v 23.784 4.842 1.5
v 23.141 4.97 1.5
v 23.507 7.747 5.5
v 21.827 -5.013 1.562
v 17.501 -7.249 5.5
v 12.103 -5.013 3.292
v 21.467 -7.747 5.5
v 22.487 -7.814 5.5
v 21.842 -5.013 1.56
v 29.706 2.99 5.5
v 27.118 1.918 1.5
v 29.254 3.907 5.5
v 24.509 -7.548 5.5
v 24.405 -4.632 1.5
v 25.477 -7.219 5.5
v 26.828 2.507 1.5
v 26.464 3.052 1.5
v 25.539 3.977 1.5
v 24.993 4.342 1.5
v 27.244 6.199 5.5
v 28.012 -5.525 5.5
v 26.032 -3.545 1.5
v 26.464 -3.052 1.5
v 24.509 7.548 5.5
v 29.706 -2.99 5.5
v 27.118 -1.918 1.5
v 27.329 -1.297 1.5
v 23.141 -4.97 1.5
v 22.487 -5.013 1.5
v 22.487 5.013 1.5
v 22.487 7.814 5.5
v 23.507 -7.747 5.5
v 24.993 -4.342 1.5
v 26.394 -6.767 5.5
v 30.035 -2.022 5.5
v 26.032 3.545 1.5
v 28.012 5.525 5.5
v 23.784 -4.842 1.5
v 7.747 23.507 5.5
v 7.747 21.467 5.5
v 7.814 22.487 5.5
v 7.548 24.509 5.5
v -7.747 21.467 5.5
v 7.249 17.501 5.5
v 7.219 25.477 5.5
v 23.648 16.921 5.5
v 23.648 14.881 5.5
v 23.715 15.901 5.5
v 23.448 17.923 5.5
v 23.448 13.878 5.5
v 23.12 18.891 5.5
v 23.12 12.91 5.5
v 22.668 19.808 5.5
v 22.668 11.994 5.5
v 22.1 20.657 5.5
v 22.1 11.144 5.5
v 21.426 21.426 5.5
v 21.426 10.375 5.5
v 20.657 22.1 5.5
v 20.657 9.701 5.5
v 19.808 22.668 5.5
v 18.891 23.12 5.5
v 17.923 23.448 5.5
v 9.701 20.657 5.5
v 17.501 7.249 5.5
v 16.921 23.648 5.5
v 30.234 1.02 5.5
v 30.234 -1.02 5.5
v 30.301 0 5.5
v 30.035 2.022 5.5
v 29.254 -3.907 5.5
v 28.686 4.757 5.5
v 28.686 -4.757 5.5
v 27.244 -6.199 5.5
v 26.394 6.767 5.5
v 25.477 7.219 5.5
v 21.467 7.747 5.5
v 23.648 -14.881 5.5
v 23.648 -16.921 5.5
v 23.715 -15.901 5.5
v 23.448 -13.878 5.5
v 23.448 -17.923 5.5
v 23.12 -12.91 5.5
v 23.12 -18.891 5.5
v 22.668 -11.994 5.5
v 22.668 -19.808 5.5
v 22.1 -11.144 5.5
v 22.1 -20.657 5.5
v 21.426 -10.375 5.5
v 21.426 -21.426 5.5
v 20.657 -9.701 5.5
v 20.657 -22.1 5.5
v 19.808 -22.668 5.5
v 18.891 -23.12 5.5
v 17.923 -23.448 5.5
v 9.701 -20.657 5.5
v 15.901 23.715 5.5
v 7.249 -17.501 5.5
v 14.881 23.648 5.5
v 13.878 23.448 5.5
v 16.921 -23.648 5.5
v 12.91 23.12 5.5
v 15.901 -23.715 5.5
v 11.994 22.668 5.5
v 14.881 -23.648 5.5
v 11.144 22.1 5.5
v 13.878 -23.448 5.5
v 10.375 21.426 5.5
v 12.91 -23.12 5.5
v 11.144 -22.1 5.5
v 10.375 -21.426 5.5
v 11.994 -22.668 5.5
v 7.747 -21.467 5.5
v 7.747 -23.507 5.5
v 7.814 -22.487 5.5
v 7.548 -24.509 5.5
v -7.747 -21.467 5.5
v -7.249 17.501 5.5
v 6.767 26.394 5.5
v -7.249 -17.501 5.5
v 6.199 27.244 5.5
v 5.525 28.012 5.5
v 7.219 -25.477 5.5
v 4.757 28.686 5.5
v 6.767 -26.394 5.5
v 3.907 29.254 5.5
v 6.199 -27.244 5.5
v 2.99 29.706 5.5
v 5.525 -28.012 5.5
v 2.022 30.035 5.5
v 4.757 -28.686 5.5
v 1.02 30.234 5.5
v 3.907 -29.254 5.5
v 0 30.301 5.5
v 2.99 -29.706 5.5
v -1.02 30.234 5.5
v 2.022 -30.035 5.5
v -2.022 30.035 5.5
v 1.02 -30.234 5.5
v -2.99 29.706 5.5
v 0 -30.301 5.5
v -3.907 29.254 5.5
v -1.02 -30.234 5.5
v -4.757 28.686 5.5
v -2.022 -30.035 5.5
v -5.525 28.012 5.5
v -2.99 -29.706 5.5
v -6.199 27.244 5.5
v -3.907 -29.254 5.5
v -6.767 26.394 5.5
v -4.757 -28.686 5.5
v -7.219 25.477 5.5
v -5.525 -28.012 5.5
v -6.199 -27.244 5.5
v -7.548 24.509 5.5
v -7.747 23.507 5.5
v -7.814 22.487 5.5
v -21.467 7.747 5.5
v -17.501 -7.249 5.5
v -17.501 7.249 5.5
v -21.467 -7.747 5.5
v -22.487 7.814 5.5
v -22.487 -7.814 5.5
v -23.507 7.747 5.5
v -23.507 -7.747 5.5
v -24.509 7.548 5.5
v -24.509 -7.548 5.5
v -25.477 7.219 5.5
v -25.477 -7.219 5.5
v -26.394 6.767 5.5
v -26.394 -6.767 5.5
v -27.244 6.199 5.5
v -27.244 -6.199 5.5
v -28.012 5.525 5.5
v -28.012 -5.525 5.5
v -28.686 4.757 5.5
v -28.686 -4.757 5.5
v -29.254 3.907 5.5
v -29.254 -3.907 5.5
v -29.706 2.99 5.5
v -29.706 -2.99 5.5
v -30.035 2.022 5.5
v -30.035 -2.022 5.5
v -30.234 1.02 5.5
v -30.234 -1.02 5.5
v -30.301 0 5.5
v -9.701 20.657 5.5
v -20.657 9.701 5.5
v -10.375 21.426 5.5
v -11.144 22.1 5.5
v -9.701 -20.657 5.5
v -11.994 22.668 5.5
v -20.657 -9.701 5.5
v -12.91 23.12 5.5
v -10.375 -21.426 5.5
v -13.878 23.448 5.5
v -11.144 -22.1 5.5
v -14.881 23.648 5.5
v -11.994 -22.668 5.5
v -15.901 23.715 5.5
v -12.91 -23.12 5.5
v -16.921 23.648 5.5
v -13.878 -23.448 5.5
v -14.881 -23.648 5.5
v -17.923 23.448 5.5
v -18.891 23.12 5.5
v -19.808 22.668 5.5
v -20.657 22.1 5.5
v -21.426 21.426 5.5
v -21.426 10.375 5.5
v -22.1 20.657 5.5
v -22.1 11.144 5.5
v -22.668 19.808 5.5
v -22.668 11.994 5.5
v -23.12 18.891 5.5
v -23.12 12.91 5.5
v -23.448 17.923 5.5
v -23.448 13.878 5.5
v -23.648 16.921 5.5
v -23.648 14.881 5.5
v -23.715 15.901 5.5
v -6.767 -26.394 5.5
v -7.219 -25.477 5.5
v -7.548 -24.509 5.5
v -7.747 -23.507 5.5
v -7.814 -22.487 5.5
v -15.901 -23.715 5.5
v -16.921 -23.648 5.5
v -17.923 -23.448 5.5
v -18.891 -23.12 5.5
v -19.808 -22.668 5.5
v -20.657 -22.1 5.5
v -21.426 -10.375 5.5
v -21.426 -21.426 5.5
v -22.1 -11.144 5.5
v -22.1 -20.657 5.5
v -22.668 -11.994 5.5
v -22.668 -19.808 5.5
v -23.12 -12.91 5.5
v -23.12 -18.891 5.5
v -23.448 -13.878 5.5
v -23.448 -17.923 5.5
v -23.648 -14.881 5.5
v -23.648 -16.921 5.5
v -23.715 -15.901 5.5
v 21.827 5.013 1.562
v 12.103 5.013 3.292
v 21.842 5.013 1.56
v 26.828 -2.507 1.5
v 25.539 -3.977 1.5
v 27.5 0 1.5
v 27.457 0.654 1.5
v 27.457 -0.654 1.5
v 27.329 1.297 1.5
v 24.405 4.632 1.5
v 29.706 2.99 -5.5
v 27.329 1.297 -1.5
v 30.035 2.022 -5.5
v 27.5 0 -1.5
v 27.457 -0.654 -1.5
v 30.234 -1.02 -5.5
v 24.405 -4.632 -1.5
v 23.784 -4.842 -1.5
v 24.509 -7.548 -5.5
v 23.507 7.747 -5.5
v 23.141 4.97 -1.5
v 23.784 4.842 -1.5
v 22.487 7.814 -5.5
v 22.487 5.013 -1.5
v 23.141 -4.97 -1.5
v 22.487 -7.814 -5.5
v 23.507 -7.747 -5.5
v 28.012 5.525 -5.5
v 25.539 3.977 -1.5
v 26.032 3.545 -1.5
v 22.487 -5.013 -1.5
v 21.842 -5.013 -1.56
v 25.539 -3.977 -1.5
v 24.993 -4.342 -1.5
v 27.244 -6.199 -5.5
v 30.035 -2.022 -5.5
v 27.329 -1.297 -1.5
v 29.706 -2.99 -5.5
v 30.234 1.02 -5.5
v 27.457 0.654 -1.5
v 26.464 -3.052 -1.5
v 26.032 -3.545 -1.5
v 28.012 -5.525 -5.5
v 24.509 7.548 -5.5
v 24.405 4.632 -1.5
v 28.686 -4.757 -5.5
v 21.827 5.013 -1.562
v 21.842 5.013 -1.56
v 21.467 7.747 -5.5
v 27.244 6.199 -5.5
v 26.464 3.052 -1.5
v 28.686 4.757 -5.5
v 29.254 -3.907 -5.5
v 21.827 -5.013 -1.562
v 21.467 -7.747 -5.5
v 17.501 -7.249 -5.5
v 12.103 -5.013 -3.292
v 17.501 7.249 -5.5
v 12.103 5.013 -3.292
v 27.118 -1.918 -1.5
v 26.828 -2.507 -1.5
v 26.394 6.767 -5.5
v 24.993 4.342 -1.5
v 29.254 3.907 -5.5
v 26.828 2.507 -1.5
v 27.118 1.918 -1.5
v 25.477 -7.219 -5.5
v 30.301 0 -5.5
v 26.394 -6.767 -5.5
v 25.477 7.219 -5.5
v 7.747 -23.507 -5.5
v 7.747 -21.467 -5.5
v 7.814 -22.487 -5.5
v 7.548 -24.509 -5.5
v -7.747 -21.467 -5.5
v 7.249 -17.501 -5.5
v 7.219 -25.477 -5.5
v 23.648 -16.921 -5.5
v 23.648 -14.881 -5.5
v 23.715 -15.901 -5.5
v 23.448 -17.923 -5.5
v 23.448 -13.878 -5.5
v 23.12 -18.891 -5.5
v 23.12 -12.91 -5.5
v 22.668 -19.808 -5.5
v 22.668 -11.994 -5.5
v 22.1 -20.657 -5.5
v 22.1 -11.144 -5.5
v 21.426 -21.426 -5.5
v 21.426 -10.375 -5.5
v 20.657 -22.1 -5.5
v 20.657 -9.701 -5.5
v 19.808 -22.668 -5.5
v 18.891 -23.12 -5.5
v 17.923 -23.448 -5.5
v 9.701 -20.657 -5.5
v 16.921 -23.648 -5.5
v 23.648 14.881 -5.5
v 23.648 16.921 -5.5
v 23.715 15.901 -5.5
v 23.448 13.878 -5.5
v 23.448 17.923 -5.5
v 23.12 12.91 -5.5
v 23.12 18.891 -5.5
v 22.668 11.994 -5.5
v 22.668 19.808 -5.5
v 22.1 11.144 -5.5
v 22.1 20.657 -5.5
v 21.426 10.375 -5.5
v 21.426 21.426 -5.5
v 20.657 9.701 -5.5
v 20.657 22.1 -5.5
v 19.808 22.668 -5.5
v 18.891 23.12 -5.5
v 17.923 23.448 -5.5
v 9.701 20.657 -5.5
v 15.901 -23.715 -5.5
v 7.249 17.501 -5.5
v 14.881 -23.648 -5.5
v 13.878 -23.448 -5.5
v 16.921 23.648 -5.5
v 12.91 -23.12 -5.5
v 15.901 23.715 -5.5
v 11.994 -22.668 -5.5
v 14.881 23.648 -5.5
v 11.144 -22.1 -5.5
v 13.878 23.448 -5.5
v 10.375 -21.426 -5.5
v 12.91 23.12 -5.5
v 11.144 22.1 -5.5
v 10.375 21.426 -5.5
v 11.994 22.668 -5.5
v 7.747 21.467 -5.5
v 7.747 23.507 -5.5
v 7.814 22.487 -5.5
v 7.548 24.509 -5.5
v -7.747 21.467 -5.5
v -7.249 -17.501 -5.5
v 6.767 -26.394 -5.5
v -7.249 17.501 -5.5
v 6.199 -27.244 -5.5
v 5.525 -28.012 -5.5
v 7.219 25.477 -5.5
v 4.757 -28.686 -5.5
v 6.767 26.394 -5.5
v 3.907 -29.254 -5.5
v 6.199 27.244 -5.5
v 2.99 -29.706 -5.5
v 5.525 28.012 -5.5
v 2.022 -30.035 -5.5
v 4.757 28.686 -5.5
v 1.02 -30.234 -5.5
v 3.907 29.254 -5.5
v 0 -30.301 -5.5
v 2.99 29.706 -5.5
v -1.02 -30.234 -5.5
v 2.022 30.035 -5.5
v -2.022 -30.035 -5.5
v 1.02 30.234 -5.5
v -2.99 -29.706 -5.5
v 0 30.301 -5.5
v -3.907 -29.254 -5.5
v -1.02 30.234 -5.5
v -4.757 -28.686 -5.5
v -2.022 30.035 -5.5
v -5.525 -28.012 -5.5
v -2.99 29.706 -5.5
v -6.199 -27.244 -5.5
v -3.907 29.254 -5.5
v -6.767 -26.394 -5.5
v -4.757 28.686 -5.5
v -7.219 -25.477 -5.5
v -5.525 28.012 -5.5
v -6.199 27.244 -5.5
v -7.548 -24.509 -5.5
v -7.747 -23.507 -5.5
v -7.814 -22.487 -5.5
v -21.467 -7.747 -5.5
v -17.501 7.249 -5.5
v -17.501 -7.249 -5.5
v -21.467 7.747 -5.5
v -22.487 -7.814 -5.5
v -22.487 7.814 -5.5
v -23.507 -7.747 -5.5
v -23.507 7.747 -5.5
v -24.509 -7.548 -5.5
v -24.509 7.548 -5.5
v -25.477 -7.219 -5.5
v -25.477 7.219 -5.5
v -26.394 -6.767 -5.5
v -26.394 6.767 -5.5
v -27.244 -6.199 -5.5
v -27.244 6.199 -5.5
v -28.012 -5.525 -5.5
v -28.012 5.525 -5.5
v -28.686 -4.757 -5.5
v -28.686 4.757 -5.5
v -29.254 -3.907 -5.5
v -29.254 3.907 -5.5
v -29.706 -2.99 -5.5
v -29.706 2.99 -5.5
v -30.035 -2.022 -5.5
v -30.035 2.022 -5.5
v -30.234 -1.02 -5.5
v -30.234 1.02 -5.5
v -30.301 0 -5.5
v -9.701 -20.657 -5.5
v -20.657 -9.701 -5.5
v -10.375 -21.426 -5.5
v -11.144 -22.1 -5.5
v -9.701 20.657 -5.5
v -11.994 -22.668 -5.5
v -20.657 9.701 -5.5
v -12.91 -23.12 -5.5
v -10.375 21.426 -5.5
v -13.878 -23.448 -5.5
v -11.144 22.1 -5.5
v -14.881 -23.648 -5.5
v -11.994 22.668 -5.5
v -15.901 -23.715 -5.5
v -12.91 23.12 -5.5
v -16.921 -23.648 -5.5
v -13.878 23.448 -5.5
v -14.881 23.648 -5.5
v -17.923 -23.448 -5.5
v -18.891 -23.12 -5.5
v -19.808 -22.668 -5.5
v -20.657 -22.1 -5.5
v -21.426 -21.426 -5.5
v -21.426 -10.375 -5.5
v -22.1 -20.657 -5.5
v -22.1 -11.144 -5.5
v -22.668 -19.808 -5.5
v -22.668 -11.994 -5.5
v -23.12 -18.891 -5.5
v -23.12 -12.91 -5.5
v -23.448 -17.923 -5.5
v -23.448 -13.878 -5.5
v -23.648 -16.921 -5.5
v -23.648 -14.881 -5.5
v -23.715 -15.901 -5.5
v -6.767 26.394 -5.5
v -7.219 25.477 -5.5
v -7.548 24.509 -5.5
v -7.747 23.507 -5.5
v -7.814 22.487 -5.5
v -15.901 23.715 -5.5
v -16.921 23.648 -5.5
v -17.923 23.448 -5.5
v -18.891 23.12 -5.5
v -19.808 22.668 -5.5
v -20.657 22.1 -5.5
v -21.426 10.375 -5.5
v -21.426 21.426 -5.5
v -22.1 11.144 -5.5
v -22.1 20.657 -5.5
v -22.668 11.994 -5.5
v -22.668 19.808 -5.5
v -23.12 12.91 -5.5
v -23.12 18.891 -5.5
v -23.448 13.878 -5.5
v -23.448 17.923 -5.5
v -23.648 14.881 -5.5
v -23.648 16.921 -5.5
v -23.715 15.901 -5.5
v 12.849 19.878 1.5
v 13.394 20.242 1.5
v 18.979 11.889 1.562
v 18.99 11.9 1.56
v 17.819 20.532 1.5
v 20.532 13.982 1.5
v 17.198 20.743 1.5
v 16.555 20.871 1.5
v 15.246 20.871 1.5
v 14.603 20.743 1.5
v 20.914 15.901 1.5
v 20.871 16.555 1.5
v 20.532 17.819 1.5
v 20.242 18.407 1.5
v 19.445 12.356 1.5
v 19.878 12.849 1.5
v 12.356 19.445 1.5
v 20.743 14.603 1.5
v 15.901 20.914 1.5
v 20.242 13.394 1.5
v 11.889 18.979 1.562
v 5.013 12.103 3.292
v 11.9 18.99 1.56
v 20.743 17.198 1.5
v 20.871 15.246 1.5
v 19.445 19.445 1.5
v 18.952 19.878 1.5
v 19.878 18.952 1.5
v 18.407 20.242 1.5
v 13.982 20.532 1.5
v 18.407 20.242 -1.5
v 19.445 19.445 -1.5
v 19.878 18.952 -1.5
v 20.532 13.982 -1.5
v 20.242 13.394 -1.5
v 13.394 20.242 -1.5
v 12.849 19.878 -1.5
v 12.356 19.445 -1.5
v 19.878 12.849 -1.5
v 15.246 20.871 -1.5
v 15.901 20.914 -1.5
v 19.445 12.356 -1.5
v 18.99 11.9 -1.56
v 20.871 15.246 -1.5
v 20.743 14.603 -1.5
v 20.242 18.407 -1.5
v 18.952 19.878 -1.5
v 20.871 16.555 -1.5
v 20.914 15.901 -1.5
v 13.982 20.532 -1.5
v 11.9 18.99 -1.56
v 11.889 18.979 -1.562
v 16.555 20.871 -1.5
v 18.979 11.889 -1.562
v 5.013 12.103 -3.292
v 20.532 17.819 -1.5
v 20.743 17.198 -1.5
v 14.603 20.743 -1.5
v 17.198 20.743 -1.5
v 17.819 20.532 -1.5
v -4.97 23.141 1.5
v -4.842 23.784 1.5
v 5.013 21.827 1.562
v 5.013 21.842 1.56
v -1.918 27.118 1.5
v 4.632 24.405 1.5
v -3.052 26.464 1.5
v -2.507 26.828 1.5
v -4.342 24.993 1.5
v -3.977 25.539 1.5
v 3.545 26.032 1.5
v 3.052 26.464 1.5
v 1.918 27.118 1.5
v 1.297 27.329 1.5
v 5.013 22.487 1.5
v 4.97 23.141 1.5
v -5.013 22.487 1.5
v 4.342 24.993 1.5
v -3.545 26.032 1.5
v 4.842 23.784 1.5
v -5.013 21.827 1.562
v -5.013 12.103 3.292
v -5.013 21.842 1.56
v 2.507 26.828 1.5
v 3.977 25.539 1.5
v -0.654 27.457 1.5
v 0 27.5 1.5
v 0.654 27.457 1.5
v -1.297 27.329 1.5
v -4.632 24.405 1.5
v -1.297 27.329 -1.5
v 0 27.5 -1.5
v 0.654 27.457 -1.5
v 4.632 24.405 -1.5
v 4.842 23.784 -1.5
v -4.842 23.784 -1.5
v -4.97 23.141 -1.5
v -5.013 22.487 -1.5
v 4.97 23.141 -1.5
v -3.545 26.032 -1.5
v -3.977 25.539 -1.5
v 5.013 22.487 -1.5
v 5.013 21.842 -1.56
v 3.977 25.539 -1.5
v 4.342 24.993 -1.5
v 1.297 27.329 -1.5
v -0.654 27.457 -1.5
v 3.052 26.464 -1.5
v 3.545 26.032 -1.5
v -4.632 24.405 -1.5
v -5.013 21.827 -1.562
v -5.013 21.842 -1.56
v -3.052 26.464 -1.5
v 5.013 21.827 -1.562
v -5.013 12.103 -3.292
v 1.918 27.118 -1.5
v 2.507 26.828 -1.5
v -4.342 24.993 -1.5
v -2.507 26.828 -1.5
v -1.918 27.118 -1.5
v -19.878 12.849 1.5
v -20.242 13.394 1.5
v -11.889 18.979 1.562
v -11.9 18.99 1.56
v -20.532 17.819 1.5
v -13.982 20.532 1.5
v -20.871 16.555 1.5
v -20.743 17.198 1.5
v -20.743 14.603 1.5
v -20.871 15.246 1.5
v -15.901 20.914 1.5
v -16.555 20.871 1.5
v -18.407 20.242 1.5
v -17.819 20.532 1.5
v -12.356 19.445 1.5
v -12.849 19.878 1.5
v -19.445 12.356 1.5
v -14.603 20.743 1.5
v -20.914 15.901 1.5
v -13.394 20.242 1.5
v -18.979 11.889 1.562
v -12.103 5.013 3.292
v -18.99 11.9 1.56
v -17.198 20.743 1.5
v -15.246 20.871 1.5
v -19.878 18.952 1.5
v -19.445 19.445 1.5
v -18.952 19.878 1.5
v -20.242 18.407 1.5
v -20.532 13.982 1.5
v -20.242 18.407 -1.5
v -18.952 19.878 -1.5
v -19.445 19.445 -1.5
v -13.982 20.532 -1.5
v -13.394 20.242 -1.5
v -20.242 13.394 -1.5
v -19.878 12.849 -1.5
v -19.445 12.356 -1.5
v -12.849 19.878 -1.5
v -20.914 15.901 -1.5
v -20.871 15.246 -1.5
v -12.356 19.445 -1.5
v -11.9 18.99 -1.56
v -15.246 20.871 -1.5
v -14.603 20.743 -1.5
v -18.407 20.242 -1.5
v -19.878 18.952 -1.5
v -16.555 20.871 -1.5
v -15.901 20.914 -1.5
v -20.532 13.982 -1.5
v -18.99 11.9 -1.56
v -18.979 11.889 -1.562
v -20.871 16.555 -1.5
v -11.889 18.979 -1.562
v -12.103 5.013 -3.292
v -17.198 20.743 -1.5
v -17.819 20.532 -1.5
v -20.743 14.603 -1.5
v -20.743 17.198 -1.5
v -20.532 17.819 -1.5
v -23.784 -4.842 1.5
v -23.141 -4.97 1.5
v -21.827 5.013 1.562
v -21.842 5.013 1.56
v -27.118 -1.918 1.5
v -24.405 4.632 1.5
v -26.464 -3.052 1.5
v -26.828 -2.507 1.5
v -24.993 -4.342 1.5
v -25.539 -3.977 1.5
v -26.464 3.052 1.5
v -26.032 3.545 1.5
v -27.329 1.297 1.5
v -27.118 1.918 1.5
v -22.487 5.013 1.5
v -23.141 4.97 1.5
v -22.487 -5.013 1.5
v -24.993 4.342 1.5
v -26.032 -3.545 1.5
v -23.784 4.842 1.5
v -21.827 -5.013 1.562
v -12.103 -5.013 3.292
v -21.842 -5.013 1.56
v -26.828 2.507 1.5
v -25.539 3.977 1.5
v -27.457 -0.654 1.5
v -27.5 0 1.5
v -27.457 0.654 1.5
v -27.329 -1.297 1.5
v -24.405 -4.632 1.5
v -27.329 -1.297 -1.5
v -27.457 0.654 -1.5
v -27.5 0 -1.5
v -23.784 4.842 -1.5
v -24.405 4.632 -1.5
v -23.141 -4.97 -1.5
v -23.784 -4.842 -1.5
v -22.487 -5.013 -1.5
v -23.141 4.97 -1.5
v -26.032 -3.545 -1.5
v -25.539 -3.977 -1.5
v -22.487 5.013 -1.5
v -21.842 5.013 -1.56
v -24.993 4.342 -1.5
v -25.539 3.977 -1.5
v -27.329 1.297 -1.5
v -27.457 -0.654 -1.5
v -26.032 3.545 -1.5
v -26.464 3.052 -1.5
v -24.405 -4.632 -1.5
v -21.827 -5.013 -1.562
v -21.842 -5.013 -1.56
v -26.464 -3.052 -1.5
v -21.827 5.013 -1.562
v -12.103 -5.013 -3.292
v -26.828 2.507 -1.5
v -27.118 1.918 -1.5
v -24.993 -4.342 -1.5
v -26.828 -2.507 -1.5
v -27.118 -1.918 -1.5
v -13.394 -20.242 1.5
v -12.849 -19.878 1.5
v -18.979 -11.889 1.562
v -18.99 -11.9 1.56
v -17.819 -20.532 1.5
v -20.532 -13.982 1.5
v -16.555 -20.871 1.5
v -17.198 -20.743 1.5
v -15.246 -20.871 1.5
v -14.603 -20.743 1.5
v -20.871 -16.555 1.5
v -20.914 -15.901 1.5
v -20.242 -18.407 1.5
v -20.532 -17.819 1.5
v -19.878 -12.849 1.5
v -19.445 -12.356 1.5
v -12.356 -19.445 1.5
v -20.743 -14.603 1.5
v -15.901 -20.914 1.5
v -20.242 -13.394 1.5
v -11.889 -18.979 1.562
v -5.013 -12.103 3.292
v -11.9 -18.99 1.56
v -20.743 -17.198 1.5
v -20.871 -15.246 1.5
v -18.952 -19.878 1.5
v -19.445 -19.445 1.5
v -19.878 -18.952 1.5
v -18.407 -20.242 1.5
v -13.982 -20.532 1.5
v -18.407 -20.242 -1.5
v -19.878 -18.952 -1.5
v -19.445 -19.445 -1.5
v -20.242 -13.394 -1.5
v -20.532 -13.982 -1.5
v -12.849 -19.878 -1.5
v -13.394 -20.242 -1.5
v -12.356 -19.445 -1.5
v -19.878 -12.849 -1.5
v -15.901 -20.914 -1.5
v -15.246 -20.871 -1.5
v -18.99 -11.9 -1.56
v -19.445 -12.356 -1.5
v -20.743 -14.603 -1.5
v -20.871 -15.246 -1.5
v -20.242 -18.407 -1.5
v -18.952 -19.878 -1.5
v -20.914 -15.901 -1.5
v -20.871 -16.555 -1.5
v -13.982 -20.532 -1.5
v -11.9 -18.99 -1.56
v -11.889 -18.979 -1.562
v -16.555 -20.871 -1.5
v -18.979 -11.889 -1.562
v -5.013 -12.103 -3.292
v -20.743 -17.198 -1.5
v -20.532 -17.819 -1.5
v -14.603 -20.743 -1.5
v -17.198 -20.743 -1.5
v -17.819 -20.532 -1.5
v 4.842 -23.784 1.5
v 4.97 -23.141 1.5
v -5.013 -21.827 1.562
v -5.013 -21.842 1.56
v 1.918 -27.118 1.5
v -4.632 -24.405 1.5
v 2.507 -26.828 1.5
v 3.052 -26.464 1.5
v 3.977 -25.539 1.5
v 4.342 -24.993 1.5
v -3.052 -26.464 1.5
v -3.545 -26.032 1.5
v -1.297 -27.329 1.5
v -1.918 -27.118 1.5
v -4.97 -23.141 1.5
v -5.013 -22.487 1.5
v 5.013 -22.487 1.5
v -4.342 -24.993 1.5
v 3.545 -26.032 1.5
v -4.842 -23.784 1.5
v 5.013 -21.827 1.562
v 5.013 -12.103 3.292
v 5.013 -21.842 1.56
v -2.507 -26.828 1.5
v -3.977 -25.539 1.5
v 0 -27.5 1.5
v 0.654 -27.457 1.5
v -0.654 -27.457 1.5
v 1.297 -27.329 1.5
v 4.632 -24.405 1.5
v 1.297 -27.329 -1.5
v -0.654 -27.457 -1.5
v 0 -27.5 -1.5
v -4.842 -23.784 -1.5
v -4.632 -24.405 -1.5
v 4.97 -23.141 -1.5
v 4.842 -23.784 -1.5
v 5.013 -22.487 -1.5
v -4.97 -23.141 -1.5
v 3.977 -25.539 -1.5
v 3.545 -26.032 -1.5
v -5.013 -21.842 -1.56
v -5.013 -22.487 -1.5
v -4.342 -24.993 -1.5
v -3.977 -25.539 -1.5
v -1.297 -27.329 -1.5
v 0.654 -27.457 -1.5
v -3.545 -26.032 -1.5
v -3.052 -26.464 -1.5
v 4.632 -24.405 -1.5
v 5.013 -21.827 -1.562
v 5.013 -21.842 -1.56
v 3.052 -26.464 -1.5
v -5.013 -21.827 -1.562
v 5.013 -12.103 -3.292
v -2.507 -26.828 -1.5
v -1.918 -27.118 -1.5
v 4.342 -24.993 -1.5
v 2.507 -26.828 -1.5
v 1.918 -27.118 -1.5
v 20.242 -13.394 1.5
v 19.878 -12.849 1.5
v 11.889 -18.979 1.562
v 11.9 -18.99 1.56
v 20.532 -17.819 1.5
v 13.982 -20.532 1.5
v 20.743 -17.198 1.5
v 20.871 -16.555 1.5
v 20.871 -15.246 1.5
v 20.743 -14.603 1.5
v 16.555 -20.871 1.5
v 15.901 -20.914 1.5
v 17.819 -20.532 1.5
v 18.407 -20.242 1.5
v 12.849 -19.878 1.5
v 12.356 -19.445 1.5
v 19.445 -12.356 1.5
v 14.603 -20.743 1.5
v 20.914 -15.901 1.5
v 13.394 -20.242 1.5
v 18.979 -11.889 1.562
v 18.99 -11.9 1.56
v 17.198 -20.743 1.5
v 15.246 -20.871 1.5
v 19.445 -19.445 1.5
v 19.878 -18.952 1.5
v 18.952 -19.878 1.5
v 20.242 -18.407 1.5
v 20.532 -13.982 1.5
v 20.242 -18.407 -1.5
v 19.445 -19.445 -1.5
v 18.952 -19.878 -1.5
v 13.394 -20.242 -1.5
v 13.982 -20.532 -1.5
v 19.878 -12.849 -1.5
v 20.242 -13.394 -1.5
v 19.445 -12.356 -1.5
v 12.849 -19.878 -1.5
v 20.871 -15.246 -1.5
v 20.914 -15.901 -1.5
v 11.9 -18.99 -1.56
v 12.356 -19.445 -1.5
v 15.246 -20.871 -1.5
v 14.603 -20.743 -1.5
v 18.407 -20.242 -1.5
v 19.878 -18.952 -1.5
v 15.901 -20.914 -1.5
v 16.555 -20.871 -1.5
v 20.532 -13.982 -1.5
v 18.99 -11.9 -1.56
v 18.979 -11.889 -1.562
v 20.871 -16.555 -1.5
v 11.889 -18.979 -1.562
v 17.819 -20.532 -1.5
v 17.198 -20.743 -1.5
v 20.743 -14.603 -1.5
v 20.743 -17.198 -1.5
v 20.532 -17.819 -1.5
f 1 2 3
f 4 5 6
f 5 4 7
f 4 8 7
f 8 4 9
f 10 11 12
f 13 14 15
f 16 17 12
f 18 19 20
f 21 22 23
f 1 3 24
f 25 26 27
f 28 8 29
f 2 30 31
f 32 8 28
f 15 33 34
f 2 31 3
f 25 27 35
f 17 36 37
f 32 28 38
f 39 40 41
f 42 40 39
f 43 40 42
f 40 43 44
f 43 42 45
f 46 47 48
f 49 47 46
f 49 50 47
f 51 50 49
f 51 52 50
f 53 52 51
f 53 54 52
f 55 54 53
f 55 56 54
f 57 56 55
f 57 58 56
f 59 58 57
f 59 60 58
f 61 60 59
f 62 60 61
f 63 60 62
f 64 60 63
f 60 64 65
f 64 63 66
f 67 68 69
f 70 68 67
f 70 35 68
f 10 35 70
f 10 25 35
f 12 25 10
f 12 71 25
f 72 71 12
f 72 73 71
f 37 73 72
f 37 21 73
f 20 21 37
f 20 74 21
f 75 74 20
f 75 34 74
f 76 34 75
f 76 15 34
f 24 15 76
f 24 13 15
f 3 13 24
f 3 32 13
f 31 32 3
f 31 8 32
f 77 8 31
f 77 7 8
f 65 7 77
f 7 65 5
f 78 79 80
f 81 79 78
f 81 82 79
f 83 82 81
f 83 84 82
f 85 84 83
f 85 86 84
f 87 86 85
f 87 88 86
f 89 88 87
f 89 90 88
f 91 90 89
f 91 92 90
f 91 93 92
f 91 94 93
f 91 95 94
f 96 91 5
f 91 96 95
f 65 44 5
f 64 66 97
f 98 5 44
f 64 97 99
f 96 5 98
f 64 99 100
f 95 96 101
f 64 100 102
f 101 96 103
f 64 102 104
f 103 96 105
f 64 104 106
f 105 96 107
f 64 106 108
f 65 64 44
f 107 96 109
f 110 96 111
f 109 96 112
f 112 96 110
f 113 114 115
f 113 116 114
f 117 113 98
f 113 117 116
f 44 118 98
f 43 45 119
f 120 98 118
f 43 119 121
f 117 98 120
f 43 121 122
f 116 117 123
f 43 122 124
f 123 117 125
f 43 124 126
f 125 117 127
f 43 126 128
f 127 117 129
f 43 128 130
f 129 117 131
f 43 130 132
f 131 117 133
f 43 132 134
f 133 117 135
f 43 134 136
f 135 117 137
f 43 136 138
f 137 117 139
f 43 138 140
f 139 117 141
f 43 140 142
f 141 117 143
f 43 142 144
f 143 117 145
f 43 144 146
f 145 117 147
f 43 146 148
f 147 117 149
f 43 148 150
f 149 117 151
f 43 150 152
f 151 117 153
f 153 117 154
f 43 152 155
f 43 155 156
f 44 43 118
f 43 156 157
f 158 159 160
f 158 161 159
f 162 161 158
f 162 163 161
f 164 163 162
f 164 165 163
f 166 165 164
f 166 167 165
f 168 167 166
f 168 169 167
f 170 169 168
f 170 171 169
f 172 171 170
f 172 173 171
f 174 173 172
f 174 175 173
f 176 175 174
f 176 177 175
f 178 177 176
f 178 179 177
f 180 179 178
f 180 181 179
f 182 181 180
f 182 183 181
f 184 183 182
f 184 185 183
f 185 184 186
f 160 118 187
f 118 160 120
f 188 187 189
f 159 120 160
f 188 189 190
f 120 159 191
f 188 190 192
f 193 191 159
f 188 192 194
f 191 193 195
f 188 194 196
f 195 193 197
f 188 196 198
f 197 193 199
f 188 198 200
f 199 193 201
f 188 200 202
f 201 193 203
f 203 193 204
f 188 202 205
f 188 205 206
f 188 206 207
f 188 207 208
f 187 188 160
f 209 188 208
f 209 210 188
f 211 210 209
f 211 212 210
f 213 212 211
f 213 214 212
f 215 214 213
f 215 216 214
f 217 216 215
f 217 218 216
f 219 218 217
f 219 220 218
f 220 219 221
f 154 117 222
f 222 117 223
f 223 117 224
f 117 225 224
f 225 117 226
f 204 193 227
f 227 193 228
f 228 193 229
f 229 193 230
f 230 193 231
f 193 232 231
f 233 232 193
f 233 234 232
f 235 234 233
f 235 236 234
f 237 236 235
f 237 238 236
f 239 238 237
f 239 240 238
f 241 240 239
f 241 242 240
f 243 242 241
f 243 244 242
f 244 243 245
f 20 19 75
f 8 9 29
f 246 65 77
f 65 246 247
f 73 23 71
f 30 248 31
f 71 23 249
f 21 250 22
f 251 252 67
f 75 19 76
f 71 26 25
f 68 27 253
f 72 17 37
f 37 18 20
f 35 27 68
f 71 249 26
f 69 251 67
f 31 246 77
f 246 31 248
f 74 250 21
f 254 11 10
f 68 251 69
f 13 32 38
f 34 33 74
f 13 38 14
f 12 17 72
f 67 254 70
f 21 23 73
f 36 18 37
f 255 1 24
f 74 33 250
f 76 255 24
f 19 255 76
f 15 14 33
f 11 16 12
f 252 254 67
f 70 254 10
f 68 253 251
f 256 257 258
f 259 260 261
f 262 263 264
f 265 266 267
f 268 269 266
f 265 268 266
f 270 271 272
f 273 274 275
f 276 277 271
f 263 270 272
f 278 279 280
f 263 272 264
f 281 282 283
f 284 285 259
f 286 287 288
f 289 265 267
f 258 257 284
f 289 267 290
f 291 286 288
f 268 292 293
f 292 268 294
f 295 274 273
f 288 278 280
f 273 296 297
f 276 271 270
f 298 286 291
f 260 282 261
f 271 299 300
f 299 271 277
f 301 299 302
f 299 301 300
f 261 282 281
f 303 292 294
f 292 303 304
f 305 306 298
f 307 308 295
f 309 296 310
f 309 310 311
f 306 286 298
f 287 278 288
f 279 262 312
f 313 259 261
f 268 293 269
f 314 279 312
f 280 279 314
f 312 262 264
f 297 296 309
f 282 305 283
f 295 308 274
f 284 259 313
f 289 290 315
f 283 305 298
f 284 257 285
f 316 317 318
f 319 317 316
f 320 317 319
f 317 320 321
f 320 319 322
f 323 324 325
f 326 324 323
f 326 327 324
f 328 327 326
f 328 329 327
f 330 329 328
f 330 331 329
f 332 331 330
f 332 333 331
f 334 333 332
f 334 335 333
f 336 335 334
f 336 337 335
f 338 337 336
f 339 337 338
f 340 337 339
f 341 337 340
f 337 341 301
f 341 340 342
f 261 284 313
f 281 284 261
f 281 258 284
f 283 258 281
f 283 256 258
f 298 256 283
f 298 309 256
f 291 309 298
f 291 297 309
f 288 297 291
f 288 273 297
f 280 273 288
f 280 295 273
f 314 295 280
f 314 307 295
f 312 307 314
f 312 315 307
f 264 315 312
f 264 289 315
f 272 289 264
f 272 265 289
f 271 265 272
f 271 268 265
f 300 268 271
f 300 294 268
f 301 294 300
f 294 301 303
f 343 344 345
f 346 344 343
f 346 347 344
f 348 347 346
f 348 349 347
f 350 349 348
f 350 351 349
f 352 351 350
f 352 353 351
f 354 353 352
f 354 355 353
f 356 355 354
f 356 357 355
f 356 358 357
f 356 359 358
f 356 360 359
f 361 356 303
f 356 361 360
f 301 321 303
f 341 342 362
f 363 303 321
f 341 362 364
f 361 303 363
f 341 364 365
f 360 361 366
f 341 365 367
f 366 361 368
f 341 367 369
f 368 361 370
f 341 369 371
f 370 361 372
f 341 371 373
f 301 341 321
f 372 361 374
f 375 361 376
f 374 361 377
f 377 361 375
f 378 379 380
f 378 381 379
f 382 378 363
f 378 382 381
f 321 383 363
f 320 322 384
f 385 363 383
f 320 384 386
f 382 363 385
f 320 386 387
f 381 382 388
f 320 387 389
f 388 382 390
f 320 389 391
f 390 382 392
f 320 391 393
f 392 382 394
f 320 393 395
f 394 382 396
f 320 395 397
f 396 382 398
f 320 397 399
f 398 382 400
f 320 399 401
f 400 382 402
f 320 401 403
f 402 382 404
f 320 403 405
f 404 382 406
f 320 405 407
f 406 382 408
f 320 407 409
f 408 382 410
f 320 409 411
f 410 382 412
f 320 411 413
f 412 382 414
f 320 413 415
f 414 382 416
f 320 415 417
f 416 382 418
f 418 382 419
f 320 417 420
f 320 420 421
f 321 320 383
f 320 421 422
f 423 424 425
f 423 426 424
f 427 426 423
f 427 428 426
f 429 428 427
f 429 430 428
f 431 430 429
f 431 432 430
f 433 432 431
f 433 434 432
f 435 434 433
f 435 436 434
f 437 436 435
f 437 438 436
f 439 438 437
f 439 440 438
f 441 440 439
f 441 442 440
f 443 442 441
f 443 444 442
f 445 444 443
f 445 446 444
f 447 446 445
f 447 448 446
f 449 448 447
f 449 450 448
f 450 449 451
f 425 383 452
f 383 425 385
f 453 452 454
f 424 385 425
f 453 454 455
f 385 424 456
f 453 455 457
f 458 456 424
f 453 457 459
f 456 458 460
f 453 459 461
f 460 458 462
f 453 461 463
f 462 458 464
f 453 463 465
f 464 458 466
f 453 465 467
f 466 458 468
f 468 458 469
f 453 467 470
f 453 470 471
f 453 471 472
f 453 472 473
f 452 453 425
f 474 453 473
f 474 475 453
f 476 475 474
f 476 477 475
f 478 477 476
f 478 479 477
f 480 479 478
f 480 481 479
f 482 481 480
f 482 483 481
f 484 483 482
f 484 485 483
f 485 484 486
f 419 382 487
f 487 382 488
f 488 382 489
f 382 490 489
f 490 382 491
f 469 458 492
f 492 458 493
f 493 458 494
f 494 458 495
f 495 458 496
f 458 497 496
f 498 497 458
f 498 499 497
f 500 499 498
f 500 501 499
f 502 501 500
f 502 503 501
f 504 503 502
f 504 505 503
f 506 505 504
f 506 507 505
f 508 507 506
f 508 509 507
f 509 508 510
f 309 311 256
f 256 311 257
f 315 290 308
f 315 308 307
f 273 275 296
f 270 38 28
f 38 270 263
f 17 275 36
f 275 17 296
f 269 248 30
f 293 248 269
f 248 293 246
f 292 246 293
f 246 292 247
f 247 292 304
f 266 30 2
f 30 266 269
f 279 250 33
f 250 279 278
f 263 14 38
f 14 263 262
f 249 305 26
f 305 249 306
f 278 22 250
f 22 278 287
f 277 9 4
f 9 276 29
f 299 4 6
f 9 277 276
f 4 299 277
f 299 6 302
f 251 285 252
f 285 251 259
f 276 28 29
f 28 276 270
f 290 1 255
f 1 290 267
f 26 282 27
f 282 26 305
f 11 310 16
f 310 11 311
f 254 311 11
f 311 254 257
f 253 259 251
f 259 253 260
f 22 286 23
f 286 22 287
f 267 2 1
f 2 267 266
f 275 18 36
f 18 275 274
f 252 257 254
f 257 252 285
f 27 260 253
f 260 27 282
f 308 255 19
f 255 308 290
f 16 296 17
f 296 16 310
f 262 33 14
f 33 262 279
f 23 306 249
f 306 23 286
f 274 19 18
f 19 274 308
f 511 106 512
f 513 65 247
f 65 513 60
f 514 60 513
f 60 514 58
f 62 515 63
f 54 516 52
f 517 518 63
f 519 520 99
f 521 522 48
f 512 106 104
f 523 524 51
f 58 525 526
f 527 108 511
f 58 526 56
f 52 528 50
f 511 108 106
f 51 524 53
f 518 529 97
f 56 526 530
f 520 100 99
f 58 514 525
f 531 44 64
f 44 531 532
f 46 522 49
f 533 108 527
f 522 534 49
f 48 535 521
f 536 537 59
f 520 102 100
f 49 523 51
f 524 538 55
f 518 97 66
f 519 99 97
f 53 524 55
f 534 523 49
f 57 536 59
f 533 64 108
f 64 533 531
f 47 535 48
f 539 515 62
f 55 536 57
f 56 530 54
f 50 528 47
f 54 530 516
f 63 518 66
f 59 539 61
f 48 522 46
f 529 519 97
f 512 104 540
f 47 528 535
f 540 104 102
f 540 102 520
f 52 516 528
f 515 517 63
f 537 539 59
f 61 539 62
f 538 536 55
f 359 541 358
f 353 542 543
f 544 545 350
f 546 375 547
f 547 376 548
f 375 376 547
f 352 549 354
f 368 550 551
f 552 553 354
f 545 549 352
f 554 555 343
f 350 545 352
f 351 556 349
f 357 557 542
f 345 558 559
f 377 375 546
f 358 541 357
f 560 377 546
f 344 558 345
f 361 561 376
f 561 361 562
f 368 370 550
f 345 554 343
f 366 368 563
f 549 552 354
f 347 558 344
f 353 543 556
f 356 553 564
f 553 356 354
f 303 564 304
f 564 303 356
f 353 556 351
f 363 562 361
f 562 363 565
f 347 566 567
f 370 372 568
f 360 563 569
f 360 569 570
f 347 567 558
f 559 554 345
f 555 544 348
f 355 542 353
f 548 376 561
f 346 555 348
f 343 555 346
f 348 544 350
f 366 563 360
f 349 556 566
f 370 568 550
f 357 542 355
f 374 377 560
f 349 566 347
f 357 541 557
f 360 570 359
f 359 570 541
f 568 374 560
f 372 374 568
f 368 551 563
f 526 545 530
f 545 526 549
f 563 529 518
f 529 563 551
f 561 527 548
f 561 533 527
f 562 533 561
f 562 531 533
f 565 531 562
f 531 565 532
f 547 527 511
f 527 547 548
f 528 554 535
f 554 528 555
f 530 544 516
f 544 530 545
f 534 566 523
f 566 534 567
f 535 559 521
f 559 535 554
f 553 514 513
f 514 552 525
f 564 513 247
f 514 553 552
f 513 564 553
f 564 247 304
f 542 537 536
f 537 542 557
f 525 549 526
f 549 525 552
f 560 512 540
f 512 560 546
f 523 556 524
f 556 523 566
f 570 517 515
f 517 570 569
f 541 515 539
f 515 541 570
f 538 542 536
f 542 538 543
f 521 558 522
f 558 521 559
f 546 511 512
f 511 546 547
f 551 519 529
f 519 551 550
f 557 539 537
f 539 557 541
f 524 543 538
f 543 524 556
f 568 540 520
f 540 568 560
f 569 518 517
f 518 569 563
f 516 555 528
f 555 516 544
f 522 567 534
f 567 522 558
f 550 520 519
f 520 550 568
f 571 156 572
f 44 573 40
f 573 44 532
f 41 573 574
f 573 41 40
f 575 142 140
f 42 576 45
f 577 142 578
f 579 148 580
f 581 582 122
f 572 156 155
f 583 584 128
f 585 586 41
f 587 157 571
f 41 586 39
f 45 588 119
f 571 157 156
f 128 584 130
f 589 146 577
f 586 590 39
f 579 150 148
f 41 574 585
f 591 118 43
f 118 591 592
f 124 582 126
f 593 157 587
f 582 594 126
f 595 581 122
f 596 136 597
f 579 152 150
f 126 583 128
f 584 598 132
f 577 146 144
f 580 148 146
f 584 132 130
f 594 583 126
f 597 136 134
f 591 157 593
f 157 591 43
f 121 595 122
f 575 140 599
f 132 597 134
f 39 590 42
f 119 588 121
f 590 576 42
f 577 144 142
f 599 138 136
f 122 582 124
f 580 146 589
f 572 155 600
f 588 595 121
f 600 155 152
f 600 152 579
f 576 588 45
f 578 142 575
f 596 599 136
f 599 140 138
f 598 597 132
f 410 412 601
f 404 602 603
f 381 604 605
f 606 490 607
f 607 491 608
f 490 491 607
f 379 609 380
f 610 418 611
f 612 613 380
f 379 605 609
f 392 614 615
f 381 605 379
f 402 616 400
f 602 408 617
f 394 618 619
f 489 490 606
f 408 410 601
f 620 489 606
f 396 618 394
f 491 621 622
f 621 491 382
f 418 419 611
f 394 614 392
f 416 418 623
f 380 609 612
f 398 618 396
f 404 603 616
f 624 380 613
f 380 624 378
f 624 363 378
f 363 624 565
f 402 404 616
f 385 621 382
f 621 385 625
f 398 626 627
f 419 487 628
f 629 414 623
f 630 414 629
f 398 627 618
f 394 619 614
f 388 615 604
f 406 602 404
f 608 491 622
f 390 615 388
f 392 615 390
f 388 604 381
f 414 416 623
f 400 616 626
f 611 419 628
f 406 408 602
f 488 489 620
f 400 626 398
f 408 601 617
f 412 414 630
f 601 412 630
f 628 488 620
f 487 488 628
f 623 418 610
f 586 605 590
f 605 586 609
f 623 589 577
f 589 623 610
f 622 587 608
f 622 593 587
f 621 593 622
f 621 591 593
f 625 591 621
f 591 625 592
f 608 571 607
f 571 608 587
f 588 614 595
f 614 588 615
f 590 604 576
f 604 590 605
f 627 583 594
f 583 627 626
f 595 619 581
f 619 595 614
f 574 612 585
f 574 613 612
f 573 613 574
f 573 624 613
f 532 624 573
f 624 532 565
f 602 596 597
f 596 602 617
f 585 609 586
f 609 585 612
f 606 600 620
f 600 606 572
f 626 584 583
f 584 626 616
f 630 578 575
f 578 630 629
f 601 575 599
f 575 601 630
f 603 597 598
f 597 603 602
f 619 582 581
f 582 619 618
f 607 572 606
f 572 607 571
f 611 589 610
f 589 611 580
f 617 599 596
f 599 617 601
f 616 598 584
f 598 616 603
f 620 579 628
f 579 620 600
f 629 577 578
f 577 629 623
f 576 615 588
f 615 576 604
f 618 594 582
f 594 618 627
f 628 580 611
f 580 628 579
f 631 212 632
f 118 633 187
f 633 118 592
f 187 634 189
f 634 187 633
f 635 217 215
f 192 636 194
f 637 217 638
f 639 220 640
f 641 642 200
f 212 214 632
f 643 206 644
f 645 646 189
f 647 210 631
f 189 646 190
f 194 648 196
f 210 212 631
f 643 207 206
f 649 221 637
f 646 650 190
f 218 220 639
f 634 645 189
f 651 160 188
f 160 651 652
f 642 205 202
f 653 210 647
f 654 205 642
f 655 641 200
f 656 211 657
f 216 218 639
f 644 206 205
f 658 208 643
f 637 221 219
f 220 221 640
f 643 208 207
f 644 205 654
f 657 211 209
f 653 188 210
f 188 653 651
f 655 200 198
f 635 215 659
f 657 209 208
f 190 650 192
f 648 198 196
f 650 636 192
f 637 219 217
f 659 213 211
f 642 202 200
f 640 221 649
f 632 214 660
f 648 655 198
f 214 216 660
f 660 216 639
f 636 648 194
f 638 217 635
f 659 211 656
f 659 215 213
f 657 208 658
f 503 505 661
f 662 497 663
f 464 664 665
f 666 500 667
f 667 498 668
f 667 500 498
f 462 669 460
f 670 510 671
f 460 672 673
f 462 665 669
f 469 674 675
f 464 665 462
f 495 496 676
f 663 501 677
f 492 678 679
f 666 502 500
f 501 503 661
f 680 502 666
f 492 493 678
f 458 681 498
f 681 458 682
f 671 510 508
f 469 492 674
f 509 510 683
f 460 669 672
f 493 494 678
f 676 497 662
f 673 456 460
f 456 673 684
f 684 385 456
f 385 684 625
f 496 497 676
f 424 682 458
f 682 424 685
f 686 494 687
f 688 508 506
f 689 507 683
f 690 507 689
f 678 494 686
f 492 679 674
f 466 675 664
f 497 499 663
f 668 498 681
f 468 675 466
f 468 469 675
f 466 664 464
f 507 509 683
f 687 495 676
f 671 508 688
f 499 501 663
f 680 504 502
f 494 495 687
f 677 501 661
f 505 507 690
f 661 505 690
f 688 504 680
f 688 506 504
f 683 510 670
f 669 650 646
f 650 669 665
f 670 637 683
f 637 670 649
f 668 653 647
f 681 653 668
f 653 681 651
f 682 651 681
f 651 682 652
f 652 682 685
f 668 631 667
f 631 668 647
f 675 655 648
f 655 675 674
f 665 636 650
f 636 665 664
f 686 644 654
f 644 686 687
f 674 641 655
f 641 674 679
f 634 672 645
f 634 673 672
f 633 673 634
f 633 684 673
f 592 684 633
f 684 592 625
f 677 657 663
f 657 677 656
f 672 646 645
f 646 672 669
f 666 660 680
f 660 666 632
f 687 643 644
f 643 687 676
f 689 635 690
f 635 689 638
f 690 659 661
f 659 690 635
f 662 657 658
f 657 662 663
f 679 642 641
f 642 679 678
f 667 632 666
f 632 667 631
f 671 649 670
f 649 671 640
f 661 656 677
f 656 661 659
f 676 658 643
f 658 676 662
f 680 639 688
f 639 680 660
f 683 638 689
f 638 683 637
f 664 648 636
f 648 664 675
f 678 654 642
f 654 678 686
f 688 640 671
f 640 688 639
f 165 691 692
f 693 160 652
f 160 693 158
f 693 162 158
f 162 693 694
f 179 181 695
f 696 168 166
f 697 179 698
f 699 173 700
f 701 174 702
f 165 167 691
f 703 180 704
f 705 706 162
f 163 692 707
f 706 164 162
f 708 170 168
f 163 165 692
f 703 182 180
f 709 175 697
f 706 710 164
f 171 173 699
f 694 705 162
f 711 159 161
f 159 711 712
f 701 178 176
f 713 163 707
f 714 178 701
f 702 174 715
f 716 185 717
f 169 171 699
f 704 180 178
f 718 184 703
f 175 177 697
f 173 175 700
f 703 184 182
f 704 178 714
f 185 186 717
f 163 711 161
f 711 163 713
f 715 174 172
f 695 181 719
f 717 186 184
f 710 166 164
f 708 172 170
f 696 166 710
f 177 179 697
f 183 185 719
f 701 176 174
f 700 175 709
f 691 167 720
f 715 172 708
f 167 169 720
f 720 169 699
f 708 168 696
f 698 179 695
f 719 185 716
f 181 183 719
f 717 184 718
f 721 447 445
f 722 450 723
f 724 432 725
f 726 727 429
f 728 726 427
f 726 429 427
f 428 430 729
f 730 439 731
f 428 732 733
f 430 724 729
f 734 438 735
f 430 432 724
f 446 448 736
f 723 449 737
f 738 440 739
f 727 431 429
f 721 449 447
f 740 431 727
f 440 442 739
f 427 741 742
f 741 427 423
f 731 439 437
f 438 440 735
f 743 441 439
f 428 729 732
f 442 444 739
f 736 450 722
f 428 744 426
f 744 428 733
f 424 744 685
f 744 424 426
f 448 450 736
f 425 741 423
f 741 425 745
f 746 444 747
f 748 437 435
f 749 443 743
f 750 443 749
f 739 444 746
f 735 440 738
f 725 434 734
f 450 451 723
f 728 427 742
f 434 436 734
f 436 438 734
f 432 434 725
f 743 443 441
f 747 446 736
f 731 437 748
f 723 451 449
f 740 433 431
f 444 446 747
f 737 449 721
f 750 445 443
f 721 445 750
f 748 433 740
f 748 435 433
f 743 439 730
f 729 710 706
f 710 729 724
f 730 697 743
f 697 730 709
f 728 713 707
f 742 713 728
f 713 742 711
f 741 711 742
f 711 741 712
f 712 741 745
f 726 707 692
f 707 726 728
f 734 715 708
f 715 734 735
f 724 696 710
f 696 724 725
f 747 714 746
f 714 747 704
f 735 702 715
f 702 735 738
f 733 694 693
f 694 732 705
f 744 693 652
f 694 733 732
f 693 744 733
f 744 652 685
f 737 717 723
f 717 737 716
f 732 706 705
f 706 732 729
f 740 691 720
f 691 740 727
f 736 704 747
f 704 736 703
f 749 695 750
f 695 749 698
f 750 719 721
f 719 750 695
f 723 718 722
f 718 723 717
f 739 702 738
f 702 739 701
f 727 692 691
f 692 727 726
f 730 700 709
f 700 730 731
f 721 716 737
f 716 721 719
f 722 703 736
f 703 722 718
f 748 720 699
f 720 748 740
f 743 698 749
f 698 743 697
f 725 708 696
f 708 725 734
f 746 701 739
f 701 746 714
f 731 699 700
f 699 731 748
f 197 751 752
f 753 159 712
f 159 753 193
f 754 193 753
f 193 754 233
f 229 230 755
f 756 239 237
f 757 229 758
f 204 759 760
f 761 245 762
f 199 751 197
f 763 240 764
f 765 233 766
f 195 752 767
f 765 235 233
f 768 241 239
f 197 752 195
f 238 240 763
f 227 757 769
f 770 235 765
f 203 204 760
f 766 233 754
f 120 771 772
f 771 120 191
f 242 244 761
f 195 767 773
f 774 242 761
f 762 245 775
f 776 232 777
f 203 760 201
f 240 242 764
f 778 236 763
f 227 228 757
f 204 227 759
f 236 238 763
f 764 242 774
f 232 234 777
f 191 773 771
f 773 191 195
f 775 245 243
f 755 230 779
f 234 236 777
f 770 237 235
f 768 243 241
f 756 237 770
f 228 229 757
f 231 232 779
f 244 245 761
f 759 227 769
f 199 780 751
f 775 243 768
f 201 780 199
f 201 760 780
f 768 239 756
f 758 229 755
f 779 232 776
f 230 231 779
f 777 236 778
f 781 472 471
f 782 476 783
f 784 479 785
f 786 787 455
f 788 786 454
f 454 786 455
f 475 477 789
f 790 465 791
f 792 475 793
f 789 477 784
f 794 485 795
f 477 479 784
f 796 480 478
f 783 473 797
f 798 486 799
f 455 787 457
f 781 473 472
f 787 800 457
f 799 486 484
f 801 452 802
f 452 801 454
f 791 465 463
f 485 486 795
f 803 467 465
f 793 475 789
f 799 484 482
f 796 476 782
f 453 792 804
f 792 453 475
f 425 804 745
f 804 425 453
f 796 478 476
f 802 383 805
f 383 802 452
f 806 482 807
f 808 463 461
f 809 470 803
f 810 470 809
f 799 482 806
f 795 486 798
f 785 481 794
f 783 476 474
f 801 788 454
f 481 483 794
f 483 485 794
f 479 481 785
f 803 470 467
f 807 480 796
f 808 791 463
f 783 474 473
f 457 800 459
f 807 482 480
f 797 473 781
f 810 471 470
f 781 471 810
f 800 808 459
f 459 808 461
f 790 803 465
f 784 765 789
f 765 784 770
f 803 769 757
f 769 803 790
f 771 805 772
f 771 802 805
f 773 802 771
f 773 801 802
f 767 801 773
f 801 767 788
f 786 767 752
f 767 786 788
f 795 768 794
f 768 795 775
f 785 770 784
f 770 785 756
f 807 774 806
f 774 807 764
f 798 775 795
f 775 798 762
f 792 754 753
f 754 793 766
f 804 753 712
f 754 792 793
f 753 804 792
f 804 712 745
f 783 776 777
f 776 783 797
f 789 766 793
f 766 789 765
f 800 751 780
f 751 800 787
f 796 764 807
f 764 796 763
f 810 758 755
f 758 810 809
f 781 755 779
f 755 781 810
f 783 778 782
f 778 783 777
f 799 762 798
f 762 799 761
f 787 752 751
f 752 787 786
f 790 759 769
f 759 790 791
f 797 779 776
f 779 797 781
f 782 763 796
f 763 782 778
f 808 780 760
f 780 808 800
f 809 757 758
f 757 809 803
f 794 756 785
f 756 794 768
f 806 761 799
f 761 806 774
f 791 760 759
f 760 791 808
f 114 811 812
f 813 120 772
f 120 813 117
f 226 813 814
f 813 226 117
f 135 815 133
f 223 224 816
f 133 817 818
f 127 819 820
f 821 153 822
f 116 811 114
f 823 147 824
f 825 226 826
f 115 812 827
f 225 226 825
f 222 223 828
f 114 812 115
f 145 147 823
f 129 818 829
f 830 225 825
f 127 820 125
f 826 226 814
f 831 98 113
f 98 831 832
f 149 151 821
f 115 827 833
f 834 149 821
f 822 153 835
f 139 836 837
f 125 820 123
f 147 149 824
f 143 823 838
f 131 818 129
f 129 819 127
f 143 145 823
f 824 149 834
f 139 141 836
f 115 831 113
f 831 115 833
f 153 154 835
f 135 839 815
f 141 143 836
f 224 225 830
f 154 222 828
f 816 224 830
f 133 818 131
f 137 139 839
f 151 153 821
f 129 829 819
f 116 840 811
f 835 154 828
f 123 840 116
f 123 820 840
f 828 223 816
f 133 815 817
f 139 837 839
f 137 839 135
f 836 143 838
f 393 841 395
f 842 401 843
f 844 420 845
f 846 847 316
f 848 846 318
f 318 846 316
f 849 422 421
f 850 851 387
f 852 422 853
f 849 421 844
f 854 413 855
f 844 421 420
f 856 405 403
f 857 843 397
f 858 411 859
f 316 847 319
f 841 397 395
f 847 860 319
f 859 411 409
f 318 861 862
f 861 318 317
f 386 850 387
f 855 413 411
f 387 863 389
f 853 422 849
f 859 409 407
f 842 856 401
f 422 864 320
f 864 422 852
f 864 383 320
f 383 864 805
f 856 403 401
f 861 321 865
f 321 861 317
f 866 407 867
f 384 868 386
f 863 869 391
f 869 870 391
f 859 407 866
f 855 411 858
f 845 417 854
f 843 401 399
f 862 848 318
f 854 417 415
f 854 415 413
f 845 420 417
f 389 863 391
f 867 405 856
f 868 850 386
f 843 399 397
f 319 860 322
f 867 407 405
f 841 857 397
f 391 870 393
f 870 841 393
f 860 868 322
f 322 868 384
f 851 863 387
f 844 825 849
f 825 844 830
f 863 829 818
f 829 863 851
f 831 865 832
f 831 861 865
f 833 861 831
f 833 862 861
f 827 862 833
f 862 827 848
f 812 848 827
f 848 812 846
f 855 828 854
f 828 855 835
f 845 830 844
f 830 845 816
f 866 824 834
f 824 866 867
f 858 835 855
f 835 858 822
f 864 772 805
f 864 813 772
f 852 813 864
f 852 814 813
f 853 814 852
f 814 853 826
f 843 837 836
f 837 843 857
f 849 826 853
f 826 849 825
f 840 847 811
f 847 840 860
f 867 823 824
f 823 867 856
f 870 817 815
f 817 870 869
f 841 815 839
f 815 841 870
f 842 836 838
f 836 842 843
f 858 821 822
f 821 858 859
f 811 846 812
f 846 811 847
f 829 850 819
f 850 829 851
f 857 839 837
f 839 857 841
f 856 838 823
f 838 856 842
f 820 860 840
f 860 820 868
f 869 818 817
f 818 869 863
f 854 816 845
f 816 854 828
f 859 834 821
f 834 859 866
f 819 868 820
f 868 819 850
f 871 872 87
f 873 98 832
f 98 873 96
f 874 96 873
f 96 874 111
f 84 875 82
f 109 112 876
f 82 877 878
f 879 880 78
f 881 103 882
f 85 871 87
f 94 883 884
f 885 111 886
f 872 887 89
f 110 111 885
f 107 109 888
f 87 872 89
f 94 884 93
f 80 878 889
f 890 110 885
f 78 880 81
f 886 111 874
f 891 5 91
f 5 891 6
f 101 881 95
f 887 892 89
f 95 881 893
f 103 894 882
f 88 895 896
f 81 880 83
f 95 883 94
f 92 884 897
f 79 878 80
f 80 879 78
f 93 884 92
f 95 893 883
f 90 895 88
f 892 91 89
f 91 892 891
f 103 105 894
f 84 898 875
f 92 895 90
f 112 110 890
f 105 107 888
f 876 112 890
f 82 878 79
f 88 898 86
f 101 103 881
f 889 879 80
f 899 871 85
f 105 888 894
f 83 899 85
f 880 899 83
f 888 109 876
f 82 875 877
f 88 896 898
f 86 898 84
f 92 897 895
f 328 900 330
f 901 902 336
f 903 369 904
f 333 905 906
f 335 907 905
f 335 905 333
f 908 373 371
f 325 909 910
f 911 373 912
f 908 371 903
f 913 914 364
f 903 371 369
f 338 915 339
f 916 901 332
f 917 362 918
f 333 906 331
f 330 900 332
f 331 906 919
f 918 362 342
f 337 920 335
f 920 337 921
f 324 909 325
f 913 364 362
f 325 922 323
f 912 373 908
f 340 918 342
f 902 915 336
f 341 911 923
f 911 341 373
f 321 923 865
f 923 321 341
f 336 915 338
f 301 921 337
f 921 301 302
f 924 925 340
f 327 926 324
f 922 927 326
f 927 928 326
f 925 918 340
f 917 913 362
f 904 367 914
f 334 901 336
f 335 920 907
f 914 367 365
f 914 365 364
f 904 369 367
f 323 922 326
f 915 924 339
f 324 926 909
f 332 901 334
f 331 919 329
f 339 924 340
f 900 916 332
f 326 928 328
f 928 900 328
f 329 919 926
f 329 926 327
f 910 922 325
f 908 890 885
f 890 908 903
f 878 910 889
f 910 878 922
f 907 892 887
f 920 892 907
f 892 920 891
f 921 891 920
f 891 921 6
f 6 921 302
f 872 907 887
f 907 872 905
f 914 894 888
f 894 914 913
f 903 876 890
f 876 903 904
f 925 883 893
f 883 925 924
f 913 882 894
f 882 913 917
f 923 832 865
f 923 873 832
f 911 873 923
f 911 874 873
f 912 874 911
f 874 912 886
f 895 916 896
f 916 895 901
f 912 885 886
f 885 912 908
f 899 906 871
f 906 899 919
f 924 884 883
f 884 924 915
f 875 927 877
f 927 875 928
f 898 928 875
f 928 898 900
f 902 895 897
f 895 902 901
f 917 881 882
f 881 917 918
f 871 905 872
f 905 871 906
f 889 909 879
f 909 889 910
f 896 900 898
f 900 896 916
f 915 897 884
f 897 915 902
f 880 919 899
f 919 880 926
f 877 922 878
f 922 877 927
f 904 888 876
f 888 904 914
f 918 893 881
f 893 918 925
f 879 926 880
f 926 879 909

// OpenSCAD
// (c) h.zeller@acm.org Creative Commons license BY-SA
// Spool holder.
//
// Spools have a hole to be placed on some axis. Usually the hole
// is bigger than the axis; this spool holder is a spacer between axis and spool.

// For printing
//   - use perimeter (vertical shells) 2
//   - layer thickness: 0.2
//   - horizontal shells: 0
//   - fill density 0

// While developing, we want to see approximately how the final shape looks
// like, while for printing (developer_view=false), we get a solid for which
// the slicer generates a perimeter.
developer_view=false;

// User parameters (just mm)
spool_hole_diameter = 55;       // The diameter of the hole in the spool
axis_diameter = 25;             // Diameter of the axis we want to put it on.
                                //   (plus like 2mm to account for less accuracy)
spool_material_thickness = 3;   // The thickness of the spool material.
print_thickness = 1.2;          // Printed thickness of the walls,
                                // as determined by the perimeters (see slicer)
arm_count = 8;                  // Number of arms in this star shape.

// Probably nothing to change here.
holder_height = spool_material_thickness + 8; // The total height of the holder.
flare_angle=35;                // 0..40: Angle of the flare from the middle.
outer_flare = (holder_height - spool_material_thickness)/ (2 * tan(90 - flare_angle));


// -- local settings
$fn=48;  // Resolution of round faces. More is more smooth but blows up file-size.
inner_r=axis_diameter / 2;
outer_r=spool_hole_diameter / 2;
outer_rings_height=(holder_height - spool_material_thickness)/2;

// The width of the arm is chosen in a way that they
// intersect at the inner radius of our holder.
// This is the side-length of the regular arm_count-polygon whose
// circumcicle is the axis.
arm_r=sin(180 / arm_count) * (inner_r + print_thickness/2);

// Just for visual reference: the axis and the spool.
module reference_view() {
    cylinder(r=inner_r, h=2*holder_height, center=true);
    difference() {
    cylinder(r=outer_r + 10, h=spool_material_thickness, center=true);
    cylinder(r=outer_r, h=spool_material_thickness+0.1, center=true);
    }
}

// A cone, off-center on the z-axis.
module offset_cone(z_offset, narrow_r, wide_r) {
    translate([0, 0, z_offset])
       cylinder(r1=narrow_r, r2=wide_r,
            h=holder_height/2 - z_offset);
}

// The arm that is a bit wider on the outside.
module flare_arm(x) {
    hull() {
    offset_cone(spool_material_thickness/2, 0, arm_r);  // center cone.
    translate([x, 0, 0]) offset_cone(spool_material_thickness/2,
                                     arm_r, arm_r + outer_flare);
    }
}

// Draws an arm. Parameter: distance from center.
module star_arm(x_distance) {
    flare_arm(x_distance);                    // top
    mirror([0, 0, 1]) flare_arm(x_distance);  // bottom
    hull() {
    cylinder(r=arm_r, h=holder_height, center=true);
    translate([x_distance, 0, 0]) cylinder(r=arm_r, h=holder_height, center=true);
    }
}

module solid_cross() {
    for (i = [0:arm_count-1]) {
    rotate([0, 0, (360/arm_count) * i]) star_arm(outer_r - arm_r);
    }
}

// How this looks 'assembled'
%reference_view();

if (developer_view) {
    assign(approximate_factor=(spool_hole_diameter - 2 * print_thickness) / spool_hole_diameter) {
    difference() {
        solid_cross();
        scale([approximate_factor,approximate_factor,1.01]) solid_cross();
    }
    }
} else {
    // We create a solid. It is simpler for the slicer to create a shell.
    solid_cross();
}
